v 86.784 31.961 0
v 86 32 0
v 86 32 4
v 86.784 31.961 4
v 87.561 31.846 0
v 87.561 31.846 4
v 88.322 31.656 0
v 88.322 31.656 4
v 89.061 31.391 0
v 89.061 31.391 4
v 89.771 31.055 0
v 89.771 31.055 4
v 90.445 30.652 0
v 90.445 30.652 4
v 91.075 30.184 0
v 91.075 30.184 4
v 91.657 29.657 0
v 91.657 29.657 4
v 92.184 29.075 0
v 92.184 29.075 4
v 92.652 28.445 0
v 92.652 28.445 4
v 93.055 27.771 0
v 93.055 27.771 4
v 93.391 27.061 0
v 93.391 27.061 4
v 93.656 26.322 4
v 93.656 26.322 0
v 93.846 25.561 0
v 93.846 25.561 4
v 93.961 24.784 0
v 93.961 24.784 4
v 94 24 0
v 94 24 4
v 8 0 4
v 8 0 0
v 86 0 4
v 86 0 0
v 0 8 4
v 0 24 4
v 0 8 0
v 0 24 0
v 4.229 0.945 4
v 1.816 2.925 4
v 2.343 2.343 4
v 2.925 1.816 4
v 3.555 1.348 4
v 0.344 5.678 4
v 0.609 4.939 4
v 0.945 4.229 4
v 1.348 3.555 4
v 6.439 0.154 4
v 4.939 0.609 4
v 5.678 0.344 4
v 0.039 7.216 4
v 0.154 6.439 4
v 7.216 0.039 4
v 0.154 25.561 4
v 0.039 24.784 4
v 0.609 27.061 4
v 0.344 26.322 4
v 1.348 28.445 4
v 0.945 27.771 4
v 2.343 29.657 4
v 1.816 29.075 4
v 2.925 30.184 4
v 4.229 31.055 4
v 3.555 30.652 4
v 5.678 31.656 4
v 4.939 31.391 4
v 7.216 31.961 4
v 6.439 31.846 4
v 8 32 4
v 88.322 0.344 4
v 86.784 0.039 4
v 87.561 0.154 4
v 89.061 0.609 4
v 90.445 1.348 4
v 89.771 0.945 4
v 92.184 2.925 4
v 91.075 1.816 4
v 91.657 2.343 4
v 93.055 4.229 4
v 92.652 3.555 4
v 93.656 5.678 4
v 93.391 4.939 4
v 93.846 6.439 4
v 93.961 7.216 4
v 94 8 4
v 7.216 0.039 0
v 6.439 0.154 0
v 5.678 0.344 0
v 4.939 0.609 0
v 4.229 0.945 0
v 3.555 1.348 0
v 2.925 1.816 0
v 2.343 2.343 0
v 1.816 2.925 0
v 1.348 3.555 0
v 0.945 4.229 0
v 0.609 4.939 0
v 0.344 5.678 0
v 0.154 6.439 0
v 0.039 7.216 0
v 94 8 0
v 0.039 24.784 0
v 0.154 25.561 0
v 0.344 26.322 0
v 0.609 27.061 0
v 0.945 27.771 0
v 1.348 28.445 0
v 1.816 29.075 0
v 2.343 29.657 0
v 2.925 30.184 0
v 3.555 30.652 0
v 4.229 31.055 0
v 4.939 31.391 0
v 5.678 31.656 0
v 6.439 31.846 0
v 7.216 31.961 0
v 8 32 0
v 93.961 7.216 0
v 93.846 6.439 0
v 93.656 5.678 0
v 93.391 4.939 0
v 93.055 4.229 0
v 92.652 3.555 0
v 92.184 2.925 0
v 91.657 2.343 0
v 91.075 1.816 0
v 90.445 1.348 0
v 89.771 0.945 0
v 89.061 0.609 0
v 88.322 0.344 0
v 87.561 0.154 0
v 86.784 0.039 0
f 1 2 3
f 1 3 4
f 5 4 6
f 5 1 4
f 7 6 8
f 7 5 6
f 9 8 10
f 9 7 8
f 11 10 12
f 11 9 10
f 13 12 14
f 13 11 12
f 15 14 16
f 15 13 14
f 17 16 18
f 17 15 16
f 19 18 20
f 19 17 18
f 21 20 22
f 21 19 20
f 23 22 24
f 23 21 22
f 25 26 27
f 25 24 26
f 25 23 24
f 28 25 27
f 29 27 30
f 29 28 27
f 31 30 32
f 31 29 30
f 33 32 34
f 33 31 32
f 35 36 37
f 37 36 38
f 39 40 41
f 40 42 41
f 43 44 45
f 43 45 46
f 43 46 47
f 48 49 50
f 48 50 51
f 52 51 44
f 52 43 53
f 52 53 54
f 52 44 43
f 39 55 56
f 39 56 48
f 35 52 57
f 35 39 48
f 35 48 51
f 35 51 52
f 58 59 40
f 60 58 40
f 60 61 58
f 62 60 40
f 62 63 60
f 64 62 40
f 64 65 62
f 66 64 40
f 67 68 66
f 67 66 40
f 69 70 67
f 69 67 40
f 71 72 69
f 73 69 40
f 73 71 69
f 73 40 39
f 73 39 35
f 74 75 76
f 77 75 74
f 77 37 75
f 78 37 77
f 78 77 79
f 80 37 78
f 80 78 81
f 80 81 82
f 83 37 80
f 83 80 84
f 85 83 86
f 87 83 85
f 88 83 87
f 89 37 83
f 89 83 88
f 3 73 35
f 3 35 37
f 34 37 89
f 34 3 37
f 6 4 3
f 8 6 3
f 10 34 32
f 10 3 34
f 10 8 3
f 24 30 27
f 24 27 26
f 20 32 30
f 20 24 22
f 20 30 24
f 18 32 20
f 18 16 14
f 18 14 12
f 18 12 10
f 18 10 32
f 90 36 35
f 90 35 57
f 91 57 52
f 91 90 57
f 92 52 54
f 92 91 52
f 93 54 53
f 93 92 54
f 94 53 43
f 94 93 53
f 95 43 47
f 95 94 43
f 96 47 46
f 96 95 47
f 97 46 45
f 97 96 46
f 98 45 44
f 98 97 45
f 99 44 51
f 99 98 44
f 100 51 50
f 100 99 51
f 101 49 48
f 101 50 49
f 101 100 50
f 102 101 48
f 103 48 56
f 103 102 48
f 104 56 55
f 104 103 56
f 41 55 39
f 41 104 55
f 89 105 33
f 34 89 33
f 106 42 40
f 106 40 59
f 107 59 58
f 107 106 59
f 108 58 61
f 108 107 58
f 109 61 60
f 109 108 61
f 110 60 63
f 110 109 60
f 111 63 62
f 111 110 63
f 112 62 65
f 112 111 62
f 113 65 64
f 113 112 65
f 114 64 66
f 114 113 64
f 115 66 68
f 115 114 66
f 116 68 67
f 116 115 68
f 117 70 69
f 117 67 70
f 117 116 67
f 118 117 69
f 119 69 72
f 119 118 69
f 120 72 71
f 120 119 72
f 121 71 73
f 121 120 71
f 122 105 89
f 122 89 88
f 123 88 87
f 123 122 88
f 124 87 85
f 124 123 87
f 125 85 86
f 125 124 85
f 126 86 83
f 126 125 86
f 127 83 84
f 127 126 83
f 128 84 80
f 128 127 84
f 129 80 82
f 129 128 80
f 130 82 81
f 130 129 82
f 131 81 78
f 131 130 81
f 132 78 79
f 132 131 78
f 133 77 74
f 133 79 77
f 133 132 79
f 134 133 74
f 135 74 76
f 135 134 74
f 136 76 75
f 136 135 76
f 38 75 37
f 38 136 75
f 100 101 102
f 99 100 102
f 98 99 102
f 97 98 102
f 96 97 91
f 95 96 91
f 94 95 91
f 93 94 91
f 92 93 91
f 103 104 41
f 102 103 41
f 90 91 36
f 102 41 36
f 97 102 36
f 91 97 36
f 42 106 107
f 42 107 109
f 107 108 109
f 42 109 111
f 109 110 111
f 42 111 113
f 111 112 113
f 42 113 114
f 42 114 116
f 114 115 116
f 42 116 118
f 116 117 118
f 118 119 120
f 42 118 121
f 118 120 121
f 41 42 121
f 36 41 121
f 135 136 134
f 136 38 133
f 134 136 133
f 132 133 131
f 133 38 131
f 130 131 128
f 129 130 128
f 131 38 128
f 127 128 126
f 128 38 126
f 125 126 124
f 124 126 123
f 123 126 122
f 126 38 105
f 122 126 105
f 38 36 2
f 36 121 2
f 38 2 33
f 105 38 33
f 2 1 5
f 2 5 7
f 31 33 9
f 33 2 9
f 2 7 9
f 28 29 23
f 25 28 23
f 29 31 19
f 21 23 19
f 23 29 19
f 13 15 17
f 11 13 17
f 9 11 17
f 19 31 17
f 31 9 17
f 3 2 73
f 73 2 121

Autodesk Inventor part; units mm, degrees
ref_plane "YZ Plane" through (0, 0, 0) normal (1, 0, 0) x (0, 1, 0)
ref_plane "XZ Plane" through (0, 0, 0) normal (0, 1, 0) x (-1, 0, 0)
ref_plane "XY Plane" through (0, 0, 0) normal (0, 0, 1) x (1, 0, 0)
sketch "Sketch1" plane through (0, 0, 0) normal (0, 0, 1) x (1, 0, 0)
  line L0 (8, 0) -> (86, 0)
  line L1 (94, 8) -> (94, 24)
  line L2 (86, 32) -> (8, 32)
  line L3 (0, 24) -> (0, 8)
  arc A0 (8, 32) -> (0, 24) centre (8, 24) ccw
  arc A1 (94, 24) -> (86, 32) centre (86, 24) ccw
  arc A2 (86, 0) -> (94, 8) centre (86, 8) ccw
  arc A3 (0, 8) -> (8, 0) centre (8, 8) ccw
  circle A4 centre (51, 20) radius 5
  point P0 (0, 0)
  point P1 (94, 32)
  point P2 (94, 0)
  point P3 (0, 32)
  dimension "d0" = 94
  dimension "d1" = 32
  dimension "d2" = 8
  dimension "d3" = 8
  dimension "d6" = 10
extrude "Extrusion1" add sketch "Sketch1" along normal blind 4 contours A3 L3 A0 L2 A1 L1 A2 L0 | A4
properties part number "PistonFeederHeadInnerMini" material "Stainless Steel"
